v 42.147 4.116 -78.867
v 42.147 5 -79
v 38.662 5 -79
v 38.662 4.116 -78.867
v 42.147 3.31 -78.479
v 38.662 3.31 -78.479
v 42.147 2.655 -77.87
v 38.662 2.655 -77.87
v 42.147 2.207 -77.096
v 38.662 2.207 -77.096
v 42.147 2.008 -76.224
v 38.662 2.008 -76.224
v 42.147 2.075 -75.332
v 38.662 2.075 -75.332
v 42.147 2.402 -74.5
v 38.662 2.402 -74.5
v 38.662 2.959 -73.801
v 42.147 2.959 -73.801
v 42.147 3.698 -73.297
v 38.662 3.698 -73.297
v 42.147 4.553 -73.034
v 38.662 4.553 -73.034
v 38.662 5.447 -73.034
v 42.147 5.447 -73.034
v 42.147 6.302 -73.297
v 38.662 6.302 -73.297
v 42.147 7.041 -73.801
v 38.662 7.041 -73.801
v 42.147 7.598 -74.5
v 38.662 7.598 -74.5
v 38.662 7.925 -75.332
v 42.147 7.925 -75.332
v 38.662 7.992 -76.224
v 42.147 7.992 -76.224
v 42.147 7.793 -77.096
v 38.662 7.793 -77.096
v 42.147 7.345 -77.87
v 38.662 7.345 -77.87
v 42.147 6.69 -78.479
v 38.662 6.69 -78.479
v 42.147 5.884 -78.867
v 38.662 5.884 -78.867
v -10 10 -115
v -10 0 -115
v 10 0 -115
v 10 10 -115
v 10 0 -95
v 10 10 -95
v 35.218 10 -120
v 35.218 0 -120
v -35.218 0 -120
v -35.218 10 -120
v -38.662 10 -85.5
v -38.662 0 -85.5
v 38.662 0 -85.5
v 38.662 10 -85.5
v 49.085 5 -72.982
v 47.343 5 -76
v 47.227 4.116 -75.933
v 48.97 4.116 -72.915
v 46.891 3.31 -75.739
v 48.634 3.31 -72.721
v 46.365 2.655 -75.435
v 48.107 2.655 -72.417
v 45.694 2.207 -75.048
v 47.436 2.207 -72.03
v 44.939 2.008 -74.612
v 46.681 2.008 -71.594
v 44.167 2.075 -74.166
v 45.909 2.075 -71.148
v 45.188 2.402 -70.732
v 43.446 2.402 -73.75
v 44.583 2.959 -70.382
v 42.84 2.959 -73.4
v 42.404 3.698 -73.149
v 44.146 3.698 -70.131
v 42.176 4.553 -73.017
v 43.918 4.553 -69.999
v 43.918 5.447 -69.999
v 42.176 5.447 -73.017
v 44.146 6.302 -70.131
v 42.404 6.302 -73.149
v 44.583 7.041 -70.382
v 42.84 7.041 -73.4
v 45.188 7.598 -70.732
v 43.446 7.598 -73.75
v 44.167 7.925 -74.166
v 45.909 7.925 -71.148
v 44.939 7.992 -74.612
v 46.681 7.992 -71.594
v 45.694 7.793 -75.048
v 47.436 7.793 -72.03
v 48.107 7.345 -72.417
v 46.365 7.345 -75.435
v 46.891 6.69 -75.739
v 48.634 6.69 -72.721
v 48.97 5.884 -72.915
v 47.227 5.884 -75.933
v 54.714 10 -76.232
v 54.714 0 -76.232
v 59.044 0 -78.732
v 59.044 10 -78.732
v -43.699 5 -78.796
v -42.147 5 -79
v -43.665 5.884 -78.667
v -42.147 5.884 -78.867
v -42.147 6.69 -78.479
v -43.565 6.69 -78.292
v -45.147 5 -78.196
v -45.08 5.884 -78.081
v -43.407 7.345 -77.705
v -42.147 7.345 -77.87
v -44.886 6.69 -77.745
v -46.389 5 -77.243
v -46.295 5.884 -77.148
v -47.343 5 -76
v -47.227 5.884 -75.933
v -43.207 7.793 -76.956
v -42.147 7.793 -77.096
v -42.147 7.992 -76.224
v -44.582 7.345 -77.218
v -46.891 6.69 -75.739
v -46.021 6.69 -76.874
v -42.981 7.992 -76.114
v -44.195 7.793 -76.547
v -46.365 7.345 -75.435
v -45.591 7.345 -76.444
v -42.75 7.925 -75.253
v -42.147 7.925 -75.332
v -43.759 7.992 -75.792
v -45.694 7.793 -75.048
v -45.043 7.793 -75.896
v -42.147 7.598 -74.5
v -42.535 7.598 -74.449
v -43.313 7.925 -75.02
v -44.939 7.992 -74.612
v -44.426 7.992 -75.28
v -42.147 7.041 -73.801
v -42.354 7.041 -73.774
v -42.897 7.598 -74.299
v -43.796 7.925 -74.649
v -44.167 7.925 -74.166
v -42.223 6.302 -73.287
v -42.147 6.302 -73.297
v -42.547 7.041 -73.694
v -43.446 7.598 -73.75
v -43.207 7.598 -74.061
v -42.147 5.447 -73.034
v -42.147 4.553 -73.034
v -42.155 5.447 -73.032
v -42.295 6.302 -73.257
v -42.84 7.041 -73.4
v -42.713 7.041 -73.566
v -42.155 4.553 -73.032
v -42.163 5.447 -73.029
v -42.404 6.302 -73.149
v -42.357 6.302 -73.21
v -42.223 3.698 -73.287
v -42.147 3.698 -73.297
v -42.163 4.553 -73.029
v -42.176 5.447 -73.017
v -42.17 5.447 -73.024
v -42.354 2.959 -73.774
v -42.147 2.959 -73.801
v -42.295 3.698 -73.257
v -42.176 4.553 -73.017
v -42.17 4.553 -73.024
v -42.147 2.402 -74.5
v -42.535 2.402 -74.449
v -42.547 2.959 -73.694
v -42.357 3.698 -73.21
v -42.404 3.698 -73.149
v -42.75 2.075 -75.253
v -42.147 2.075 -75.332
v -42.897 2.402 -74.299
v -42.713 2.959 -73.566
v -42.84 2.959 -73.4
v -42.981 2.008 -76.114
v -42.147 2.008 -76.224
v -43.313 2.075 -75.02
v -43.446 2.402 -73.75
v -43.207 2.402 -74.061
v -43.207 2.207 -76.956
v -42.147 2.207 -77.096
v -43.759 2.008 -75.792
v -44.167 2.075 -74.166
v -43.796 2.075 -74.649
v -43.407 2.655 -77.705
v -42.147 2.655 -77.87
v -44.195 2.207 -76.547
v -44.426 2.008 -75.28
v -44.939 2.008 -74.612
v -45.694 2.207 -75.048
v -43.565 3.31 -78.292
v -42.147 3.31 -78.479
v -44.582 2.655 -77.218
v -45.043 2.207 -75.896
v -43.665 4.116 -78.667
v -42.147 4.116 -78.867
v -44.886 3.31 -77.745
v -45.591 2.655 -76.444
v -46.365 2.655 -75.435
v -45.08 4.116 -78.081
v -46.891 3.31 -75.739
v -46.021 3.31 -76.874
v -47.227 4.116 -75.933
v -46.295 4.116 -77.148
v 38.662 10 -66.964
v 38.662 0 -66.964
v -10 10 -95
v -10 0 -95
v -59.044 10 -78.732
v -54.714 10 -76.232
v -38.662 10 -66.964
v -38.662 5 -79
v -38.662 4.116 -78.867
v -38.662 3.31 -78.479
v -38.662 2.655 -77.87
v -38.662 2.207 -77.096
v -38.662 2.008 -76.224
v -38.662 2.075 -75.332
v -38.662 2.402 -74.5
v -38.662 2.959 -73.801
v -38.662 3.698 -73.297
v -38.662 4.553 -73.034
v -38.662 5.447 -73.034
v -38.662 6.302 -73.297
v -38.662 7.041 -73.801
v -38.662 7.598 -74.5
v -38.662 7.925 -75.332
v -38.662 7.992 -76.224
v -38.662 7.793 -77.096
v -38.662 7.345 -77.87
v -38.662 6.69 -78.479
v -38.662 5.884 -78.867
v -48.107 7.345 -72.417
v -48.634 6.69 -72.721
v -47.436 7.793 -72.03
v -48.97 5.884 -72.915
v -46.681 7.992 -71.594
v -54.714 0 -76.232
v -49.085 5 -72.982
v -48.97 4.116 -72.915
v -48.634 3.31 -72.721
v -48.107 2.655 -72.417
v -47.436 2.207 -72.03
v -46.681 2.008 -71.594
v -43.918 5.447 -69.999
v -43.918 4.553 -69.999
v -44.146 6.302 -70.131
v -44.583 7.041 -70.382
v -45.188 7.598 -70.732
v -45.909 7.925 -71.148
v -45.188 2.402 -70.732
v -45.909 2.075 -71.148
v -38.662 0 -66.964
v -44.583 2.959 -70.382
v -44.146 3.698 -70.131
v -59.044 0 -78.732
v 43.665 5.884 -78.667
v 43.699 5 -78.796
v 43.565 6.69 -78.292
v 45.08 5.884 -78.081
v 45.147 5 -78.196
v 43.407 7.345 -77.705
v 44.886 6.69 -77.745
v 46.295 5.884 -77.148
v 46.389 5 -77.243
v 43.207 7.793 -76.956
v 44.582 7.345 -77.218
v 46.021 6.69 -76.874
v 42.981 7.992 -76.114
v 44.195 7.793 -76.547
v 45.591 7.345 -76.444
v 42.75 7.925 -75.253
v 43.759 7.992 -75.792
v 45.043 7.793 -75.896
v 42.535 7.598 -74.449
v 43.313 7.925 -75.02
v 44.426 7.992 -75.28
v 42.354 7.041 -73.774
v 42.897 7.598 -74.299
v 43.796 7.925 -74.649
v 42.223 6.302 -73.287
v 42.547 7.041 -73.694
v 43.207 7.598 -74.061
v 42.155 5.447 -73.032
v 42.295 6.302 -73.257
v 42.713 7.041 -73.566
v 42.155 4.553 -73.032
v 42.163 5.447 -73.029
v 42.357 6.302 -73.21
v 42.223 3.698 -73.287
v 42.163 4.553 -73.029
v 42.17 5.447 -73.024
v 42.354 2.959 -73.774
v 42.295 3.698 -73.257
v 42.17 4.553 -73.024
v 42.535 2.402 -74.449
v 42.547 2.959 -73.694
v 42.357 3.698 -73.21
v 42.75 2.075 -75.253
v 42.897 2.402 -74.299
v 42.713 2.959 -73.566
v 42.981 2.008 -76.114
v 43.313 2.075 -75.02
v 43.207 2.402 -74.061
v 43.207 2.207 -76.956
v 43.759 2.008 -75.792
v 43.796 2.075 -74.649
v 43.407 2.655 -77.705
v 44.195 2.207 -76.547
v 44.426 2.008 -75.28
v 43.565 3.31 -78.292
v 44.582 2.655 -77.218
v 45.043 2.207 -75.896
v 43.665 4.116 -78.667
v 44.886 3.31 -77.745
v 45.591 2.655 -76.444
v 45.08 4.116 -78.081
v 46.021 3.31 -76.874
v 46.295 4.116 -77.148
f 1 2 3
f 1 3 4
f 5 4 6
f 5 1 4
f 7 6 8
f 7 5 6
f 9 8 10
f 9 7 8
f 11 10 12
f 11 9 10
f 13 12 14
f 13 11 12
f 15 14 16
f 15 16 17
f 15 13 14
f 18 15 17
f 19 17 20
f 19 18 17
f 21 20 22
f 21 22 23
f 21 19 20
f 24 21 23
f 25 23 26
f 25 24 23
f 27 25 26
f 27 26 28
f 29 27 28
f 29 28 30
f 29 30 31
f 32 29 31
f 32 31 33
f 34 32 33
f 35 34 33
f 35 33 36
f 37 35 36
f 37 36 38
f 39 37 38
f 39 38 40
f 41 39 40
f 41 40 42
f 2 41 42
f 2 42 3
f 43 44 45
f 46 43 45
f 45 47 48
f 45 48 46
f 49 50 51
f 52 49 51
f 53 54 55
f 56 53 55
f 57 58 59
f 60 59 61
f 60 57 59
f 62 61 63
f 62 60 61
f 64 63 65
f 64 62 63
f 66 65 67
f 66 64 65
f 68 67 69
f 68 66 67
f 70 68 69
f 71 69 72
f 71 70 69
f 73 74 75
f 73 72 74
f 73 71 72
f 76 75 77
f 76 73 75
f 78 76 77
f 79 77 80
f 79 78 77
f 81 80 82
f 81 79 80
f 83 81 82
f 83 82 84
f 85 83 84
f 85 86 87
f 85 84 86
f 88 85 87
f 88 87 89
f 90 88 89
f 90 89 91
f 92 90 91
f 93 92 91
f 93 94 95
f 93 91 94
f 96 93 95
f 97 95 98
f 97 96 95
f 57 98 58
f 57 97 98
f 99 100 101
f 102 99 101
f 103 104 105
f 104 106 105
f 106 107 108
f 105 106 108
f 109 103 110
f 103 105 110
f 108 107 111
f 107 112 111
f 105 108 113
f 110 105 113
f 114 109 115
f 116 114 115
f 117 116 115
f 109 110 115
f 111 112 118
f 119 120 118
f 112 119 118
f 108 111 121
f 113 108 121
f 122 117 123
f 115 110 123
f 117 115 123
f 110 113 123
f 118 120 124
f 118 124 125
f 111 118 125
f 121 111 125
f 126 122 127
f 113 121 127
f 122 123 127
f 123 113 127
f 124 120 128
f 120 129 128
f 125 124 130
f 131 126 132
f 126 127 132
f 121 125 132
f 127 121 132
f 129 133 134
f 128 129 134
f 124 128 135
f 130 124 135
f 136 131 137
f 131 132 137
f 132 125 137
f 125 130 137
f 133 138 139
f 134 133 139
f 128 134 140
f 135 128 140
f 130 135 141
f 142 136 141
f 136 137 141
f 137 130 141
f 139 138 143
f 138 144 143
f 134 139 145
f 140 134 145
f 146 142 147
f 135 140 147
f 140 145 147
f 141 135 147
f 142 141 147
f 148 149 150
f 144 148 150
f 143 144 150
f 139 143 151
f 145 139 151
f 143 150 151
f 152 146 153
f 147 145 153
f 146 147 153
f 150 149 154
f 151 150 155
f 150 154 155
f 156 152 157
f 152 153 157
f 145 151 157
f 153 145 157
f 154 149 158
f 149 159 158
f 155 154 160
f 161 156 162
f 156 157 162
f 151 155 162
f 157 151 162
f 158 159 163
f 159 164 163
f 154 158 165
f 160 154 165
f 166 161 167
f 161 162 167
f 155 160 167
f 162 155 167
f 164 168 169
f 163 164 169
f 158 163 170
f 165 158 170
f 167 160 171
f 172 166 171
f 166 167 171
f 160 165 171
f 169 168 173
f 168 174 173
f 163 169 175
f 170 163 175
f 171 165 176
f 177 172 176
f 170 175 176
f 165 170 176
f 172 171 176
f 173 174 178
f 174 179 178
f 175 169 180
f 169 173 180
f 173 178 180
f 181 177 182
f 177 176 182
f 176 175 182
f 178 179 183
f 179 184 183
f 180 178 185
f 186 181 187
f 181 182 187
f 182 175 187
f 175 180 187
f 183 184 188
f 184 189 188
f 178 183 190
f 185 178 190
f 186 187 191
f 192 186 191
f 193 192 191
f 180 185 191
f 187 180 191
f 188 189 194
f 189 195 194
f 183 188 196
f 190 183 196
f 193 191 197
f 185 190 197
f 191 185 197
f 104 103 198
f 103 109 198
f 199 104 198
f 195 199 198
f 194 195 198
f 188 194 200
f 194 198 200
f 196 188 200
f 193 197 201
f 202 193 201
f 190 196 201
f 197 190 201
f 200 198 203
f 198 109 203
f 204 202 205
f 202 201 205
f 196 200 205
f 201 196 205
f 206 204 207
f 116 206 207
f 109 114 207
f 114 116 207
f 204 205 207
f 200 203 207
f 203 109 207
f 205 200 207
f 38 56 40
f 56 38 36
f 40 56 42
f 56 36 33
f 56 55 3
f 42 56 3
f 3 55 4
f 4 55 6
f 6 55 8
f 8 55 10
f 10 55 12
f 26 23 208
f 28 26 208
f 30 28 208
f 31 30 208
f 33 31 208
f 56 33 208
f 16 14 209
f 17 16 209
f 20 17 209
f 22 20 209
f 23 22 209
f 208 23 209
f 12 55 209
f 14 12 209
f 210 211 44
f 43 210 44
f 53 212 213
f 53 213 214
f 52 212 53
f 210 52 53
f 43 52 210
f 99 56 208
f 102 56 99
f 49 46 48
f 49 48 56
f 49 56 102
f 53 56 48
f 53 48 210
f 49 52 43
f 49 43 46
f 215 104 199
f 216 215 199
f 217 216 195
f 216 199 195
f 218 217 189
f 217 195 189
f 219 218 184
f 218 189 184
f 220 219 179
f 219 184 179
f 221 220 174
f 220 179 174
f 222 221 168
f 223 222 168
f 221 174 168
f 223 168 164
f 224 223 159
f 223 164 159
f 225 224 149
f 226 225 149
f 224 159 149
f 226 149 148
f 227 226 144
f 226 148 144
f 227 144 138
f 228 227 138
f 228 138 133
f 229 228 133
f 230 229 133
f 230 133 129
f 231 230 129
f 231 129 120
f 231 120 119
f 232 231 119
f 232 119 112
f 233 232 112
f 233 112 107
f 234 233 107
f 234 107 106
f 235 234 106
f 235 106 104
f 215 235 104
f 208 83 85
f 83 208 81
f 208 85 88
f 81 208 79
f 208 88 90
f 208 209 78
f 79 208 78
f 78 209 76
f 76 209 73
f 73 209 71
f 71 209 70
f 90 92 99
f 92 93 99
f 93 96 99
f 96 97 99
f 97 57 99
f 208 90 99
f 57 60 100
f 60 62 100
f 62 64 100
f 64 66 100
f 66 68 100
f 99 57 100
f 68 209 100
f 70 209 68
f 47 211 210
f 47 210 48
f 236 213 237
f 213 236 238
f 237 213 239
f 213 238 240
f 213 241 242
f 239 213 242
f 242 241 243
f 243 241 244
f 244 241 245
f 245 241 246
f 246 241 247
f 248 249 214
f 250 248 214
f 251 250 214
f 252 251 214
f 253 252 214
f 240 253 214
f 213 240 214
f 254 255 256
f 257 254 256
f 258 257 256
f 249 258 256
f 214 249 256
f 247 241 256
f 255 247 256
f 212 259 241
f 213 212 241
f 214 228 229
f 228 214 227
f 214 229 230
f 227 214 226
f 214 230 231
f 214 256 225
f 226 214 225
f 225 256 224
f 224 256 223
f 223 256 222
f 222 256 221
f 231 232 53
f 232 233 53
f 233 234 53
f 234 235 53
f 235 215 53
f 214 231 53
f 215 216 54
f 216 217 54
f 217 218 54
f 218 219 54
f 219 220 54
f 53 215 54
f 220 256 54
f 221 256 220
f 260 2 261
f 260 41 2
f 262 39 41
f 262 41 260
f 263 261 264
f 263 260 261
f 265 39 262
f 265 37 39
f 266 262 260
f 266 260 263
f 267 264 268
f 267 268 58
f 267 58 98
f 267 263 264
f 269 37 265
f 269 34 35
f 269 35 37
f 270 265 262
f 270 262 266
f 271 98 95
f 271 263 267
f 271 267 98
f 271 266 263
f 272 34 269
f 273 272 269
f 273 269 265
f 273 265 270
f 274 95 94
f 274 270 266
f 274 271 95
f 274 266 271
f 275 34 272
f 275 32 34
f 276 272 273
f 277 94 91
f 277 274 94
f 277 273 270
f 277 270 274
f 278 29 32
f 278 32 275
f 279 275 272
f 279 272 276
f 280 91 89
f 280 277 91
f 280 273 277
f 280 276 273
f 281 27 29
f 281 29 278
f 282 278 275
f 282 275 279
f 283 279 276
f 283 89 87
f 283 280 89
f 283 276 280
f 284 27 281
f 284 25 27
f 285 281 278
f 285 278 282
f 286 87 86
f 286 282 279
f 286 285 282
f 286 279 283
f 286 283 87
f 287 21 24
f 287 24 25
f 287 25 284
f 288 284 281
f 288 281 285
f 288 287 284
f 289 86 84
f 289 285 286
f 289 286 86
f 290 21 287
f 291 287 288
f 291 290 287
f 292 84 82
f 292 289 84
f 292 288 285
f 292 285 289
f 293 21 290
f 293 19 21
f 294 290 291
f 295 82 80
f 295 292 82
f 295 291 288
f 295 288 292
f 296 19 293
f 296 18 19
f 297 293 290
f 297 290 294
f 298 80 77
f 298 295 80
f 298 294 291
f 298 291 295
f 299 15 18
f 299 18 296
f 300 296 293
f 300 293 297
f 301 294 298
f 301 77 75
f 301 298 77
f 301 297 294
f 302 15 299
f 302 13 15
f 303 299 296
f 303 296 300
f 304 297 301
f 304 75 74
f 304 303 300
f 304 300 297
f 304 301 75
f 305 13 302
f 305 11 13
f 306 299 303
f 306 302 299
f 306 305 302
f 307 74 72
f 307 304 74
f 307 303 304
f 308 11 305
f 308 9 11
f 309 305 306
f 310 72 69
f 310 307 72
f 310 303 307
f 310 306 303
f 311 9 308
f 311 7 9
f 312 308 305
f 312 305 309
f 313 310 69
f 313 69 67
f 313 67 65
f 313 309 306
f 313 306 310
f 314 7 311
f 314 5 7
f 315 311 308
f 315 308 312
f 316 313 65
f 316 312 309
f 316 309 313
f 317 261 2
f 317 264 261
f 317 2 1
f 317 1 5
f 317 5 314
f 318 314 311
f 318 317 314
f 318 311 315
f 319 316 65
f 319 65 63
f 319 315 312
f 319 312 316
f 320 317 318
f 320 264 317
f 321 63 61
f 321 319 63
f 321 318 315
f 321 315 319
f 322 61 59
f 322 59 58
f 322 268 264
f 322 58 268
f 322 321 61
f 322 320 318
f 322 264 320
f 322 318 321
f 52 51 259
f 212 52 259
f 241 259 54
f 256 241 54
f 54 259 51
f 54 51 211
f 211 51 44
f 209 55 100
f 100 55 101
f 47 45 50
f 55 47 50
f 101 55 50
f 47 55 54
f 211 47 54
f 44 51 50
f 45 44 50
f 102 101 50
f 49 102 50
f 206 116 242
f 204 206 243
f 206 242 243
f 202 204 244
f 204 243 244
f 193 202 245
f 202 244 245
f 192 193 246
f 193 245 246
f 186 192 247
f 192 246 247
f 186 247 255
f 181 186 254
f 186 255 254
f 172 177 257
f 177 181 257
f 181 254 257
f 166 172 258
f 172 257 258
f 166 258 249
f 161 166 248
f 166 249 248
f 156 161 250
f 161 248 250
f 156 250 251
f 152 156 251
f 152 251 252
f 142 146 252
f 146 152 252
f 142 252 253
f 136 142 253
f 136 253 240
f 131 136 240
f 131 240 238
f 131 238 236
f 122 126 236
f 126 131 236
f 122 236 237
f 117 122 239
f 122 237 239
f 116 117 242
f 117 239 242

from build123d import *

# Parameters (mm, degrees)
SKETCH1_W           = 20
SKETCH1_H           = 20
BOSS_EXTRUDE1_DEPTH = 10
SKETCH2_R           = 3


with BuildPart() as part:
    # Sketch1 → Boss-Extrude1 (new body)
    with BuildSketch(Plane(origin=(0, 0, 0), x_dir=(1, 0, 0), z_dir=(0, 1, 0))):
        Polygon((-59.044427996, 78.732050808), (-54.714300977, 76.232050808), (-38.661742094, 66.964101615), (-38.661742094, 85.5), (38.661742094, 85.5), (38.661742094, 66.964101615), (54.714300977, 76.232050808), (59.044427996, 78.732050808), (35.218366421, 120), (-35.218366421, 120), align=None)
        with Locations((0, 105)):
            Rectangle(SKETCH1_W, SKETCH1_H, mode=Mode.SUBTRACT)
    extrude(amount=BOSS_EXTRUDE1_DEPTH)

    # Cut-Sweep1: sweep along a path in Sketch3
    with BuildLine(Plane(origin=(0, 5, 0), x_dir=(1, 0, 0), z_dir=(0, 1, 0))) as cut_sweep1_path:
        Line((-38.661742094, 76), (-42.146569651, 76))
        ThreePointArc((-42.146569651, 76), (-43.646569651, 75.598076211), (-44.744645862, 74.5))
        Line((-44.744645862, 74.5), (-46.487059641, 71.482050808))
    # Sketch2 → Cut-Sweep1 (sweep, cut)
    with BuildSketch(Plane(origin=(-38.661742094, 0, 0), x_dir=(0, 0, -1), z_dir=(1, 0, 0))):
        with Locations((76, 5)):
            Circle(SKETCH2_R)
    cut_sweep1 = sweep(path=cut_sweep1_path.line, mode=Mode.SUBTRACT)

    # Mirror3: Cut-Sweep1 across plane
    add(cut_sweep1.mirror(Plane(origin=(0, 0, 0), x_dir=(0, 0, 1), z_dir=(1, 0, 0))), mode=Mode.SUBTRACT)


solid = part.part
